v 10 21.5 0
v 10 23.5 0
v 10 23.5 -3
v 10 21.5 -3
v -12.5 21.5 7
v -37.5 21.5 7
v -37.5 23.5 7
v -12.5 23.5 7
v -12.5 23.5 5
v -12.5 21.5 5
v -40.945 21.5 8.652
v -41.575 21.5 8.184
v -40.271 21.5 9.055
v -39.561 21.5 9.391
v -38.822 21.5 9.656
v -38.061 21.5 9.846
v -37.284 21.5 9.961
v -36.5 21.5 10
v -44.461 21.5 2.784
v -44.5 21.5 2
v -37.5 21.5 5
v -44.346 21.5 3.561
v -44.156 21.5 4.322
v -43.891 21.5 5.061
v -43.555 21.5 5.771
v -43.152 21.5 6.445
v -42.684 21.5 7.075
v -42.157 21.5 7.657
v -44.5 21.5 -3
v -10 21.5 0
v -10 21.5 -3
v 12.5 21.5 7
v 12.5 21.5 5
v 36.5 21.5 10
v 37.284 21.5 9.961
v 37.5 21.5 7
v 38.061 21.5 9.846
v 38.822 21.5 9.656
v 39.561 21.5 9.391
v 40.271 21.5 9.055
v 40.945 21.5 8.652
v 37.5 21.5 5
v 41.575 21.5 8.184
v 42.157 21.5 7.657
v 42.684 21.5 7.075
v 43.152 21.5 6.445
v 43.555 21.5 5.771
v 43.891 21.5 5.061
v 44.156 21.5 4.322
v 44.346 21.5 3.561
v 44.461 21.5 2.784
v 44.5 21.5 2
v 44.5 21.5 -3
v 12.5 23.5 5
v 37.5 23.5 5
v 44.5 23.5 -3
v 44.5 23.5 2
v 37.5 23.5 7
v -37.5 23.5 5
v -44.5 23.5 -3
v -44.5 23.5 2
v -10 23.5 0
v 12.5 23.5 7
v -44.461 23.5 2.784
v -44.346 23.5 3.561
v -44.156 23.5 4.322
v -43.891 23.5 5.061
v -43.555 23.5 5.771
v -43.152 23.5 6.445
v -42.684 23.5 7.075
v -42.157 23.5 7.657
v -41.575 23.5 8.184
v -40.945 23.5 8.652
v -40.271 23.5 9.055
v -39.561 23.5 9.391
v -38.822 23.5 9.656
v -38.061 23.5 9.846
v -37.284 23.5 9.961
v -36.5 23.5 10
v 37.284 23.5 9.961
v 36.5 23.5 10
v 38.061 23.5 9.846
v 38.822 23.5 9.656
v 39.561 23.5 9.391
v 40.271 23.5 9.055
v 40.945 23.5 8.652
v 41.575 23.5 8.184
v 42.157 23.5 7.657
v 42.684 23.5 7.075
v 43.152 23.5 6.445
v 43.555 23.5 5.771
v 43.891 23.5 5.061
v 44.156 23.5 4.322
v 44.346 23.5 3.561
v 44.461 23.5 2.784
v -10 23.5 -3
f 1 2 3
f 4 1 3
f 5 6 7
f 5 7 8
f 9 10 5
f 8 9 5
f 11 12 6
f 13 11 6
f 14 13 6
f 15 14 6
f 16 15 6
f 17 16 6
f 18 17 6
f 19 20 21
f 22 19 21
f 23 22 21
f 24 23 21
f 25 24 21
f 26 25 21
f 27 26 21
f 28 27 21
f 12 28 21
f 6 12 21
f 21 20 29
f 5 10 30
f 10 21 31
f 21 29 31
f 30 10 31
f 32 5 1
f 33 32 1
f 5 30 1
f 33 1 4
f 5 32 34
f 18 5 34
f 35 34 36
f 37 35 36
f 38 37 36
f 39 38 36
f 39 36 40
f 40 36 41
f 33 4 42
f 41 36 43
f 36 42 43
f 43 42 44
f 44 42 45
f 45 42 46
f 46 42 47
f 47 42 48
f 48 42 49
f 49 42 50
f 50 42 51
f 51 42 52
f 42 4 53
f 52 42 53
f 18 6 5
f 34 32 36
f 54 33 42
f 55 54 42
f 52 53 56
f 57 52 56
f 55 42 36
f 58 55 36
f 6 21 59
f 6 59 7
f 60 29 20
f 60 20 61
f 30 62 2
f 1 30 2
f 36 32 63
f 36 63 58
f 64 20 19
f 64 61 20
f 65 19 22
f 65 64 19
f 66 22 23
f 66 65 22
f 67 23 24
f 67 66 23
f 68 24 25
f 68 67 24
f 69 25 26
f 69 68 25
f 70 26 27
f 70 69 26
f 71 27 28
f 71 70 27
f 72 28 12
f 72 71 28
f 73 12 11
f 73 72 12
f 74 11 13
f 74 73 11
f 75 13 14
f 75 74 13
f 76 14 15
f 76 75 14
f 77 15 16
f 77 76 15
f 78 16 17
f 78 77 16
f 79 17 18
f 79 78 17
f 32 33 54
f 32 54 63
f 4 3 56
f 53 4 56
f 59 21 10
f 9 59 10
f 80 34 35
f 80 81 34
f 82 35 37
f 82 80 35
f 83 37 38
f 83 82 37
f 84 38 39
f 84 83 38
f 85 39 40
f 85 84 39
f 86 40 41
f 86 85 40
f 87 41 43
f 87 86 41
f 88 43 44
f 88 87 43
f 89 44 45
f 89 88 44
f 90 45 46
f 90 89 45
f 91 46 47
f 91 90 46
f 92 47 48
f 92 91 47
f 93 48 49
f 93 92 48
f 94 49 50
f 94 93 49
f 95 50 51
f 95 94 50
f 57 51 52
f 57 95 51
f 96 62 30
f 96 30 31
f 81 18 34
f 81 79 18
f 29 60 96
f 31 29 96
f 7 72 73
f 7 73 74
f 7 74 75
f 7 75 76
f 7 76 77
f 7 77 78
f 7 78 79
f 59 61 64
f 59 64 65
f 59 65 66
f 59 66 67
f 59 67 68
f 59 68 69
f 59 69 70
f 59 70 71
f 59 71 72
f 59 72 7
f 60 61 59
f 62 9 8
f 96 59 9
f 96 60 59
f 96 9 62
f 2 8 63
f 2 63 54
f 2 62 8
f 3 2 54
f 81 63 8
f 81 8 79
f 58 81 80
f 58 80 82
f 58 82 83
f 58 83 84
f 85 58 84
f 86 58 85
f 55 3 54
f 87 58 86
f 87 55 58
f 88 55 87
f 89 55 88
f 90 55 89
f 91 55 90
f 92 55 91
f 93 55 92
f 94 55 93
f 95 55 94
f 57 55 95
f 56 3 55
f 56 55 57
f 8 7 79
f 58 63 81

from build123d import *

# Parameters (mm, degrees)
ESTRUSIONE_ESTRUSIONE1_DEPTH      = 10
ESTRUSIONE_ESTRUSIONE1_DEPTH_BACK = 3
SCHIZZO1_W                        = 89
SCHIZZO1_H                        = 2
SCHIZZO2_W                        = 25
SCHIZZO2_H                        = 2
TAGLIO_ESTRUSIONE1_DEPTH          = 10
SCHIZZO3_W                        = 20
SCHIZZO3_H                        = 3
TAGLIO_ESTRUSIONE2_DEPTH          = 10
RACCORDO1_R                       = 8


with BuildPart() as part:
    # Schizzo1 → Estrusione-Estrusione1 (new, two sides: drawn at the far end of the back side and taken through both)
    with BuildSketch(Plane.XY.offset(-ESTRUSIONE_ESTRUSIONE1_DEPTH_BACK)):
        with Locations((0, 22.5)):
            Rectangle(SCHIZZO1_W, SCHIZZO1_H)
    extrude(amount=ESTRUSIONE_ESTRUSIONE1_DEPTH + ESTRUSIONE_ESTRUSIONE1_DEPTH_BACK)

    # Schizzo2 → Taglio-Estrusione1 (cut)
    with BuildSketch(Plane.XZ.offset(-21.5)):
        with Locations((-25, 6)):
            Rectangle(SCHIZZO2_W, SCHIZZO2_H)
        with Locations((25, 6)):
            Rectangle(SCHIZZO2_W, SCHIZZO2_H)
    extrude(amount=-TAGLIO_ESTRUSIONE1_DEPTH, mode=Mode.SUBTRACT)

    # Schizzo3 → Taglio-Estrusione2 (cut)
    with BuildSketch(Plane(origin=(0, 23.5, 0), x_dir=(1, 0, 0), z_dir=(0, 1, 0))):
        with Locations((0, 1.5)):
            Rectangle(SCHIZZO3_W, SCHIZZO3_H)
    extrude(amount=-TAGLIO_ESTRUSIONE2_DEPTH, mode=Mode.SUBTRACT)

    # Raccordo1
    raccordo1_edges = [part.edges().sort_by_distance(p)[0] for p in [
        (-44.5, 22.5, 10),
        (44.5, 22.5, 10),
    ]]
    fillet(raccordo1_edges, radius=RACCORDO1_R)


solid = part.part
